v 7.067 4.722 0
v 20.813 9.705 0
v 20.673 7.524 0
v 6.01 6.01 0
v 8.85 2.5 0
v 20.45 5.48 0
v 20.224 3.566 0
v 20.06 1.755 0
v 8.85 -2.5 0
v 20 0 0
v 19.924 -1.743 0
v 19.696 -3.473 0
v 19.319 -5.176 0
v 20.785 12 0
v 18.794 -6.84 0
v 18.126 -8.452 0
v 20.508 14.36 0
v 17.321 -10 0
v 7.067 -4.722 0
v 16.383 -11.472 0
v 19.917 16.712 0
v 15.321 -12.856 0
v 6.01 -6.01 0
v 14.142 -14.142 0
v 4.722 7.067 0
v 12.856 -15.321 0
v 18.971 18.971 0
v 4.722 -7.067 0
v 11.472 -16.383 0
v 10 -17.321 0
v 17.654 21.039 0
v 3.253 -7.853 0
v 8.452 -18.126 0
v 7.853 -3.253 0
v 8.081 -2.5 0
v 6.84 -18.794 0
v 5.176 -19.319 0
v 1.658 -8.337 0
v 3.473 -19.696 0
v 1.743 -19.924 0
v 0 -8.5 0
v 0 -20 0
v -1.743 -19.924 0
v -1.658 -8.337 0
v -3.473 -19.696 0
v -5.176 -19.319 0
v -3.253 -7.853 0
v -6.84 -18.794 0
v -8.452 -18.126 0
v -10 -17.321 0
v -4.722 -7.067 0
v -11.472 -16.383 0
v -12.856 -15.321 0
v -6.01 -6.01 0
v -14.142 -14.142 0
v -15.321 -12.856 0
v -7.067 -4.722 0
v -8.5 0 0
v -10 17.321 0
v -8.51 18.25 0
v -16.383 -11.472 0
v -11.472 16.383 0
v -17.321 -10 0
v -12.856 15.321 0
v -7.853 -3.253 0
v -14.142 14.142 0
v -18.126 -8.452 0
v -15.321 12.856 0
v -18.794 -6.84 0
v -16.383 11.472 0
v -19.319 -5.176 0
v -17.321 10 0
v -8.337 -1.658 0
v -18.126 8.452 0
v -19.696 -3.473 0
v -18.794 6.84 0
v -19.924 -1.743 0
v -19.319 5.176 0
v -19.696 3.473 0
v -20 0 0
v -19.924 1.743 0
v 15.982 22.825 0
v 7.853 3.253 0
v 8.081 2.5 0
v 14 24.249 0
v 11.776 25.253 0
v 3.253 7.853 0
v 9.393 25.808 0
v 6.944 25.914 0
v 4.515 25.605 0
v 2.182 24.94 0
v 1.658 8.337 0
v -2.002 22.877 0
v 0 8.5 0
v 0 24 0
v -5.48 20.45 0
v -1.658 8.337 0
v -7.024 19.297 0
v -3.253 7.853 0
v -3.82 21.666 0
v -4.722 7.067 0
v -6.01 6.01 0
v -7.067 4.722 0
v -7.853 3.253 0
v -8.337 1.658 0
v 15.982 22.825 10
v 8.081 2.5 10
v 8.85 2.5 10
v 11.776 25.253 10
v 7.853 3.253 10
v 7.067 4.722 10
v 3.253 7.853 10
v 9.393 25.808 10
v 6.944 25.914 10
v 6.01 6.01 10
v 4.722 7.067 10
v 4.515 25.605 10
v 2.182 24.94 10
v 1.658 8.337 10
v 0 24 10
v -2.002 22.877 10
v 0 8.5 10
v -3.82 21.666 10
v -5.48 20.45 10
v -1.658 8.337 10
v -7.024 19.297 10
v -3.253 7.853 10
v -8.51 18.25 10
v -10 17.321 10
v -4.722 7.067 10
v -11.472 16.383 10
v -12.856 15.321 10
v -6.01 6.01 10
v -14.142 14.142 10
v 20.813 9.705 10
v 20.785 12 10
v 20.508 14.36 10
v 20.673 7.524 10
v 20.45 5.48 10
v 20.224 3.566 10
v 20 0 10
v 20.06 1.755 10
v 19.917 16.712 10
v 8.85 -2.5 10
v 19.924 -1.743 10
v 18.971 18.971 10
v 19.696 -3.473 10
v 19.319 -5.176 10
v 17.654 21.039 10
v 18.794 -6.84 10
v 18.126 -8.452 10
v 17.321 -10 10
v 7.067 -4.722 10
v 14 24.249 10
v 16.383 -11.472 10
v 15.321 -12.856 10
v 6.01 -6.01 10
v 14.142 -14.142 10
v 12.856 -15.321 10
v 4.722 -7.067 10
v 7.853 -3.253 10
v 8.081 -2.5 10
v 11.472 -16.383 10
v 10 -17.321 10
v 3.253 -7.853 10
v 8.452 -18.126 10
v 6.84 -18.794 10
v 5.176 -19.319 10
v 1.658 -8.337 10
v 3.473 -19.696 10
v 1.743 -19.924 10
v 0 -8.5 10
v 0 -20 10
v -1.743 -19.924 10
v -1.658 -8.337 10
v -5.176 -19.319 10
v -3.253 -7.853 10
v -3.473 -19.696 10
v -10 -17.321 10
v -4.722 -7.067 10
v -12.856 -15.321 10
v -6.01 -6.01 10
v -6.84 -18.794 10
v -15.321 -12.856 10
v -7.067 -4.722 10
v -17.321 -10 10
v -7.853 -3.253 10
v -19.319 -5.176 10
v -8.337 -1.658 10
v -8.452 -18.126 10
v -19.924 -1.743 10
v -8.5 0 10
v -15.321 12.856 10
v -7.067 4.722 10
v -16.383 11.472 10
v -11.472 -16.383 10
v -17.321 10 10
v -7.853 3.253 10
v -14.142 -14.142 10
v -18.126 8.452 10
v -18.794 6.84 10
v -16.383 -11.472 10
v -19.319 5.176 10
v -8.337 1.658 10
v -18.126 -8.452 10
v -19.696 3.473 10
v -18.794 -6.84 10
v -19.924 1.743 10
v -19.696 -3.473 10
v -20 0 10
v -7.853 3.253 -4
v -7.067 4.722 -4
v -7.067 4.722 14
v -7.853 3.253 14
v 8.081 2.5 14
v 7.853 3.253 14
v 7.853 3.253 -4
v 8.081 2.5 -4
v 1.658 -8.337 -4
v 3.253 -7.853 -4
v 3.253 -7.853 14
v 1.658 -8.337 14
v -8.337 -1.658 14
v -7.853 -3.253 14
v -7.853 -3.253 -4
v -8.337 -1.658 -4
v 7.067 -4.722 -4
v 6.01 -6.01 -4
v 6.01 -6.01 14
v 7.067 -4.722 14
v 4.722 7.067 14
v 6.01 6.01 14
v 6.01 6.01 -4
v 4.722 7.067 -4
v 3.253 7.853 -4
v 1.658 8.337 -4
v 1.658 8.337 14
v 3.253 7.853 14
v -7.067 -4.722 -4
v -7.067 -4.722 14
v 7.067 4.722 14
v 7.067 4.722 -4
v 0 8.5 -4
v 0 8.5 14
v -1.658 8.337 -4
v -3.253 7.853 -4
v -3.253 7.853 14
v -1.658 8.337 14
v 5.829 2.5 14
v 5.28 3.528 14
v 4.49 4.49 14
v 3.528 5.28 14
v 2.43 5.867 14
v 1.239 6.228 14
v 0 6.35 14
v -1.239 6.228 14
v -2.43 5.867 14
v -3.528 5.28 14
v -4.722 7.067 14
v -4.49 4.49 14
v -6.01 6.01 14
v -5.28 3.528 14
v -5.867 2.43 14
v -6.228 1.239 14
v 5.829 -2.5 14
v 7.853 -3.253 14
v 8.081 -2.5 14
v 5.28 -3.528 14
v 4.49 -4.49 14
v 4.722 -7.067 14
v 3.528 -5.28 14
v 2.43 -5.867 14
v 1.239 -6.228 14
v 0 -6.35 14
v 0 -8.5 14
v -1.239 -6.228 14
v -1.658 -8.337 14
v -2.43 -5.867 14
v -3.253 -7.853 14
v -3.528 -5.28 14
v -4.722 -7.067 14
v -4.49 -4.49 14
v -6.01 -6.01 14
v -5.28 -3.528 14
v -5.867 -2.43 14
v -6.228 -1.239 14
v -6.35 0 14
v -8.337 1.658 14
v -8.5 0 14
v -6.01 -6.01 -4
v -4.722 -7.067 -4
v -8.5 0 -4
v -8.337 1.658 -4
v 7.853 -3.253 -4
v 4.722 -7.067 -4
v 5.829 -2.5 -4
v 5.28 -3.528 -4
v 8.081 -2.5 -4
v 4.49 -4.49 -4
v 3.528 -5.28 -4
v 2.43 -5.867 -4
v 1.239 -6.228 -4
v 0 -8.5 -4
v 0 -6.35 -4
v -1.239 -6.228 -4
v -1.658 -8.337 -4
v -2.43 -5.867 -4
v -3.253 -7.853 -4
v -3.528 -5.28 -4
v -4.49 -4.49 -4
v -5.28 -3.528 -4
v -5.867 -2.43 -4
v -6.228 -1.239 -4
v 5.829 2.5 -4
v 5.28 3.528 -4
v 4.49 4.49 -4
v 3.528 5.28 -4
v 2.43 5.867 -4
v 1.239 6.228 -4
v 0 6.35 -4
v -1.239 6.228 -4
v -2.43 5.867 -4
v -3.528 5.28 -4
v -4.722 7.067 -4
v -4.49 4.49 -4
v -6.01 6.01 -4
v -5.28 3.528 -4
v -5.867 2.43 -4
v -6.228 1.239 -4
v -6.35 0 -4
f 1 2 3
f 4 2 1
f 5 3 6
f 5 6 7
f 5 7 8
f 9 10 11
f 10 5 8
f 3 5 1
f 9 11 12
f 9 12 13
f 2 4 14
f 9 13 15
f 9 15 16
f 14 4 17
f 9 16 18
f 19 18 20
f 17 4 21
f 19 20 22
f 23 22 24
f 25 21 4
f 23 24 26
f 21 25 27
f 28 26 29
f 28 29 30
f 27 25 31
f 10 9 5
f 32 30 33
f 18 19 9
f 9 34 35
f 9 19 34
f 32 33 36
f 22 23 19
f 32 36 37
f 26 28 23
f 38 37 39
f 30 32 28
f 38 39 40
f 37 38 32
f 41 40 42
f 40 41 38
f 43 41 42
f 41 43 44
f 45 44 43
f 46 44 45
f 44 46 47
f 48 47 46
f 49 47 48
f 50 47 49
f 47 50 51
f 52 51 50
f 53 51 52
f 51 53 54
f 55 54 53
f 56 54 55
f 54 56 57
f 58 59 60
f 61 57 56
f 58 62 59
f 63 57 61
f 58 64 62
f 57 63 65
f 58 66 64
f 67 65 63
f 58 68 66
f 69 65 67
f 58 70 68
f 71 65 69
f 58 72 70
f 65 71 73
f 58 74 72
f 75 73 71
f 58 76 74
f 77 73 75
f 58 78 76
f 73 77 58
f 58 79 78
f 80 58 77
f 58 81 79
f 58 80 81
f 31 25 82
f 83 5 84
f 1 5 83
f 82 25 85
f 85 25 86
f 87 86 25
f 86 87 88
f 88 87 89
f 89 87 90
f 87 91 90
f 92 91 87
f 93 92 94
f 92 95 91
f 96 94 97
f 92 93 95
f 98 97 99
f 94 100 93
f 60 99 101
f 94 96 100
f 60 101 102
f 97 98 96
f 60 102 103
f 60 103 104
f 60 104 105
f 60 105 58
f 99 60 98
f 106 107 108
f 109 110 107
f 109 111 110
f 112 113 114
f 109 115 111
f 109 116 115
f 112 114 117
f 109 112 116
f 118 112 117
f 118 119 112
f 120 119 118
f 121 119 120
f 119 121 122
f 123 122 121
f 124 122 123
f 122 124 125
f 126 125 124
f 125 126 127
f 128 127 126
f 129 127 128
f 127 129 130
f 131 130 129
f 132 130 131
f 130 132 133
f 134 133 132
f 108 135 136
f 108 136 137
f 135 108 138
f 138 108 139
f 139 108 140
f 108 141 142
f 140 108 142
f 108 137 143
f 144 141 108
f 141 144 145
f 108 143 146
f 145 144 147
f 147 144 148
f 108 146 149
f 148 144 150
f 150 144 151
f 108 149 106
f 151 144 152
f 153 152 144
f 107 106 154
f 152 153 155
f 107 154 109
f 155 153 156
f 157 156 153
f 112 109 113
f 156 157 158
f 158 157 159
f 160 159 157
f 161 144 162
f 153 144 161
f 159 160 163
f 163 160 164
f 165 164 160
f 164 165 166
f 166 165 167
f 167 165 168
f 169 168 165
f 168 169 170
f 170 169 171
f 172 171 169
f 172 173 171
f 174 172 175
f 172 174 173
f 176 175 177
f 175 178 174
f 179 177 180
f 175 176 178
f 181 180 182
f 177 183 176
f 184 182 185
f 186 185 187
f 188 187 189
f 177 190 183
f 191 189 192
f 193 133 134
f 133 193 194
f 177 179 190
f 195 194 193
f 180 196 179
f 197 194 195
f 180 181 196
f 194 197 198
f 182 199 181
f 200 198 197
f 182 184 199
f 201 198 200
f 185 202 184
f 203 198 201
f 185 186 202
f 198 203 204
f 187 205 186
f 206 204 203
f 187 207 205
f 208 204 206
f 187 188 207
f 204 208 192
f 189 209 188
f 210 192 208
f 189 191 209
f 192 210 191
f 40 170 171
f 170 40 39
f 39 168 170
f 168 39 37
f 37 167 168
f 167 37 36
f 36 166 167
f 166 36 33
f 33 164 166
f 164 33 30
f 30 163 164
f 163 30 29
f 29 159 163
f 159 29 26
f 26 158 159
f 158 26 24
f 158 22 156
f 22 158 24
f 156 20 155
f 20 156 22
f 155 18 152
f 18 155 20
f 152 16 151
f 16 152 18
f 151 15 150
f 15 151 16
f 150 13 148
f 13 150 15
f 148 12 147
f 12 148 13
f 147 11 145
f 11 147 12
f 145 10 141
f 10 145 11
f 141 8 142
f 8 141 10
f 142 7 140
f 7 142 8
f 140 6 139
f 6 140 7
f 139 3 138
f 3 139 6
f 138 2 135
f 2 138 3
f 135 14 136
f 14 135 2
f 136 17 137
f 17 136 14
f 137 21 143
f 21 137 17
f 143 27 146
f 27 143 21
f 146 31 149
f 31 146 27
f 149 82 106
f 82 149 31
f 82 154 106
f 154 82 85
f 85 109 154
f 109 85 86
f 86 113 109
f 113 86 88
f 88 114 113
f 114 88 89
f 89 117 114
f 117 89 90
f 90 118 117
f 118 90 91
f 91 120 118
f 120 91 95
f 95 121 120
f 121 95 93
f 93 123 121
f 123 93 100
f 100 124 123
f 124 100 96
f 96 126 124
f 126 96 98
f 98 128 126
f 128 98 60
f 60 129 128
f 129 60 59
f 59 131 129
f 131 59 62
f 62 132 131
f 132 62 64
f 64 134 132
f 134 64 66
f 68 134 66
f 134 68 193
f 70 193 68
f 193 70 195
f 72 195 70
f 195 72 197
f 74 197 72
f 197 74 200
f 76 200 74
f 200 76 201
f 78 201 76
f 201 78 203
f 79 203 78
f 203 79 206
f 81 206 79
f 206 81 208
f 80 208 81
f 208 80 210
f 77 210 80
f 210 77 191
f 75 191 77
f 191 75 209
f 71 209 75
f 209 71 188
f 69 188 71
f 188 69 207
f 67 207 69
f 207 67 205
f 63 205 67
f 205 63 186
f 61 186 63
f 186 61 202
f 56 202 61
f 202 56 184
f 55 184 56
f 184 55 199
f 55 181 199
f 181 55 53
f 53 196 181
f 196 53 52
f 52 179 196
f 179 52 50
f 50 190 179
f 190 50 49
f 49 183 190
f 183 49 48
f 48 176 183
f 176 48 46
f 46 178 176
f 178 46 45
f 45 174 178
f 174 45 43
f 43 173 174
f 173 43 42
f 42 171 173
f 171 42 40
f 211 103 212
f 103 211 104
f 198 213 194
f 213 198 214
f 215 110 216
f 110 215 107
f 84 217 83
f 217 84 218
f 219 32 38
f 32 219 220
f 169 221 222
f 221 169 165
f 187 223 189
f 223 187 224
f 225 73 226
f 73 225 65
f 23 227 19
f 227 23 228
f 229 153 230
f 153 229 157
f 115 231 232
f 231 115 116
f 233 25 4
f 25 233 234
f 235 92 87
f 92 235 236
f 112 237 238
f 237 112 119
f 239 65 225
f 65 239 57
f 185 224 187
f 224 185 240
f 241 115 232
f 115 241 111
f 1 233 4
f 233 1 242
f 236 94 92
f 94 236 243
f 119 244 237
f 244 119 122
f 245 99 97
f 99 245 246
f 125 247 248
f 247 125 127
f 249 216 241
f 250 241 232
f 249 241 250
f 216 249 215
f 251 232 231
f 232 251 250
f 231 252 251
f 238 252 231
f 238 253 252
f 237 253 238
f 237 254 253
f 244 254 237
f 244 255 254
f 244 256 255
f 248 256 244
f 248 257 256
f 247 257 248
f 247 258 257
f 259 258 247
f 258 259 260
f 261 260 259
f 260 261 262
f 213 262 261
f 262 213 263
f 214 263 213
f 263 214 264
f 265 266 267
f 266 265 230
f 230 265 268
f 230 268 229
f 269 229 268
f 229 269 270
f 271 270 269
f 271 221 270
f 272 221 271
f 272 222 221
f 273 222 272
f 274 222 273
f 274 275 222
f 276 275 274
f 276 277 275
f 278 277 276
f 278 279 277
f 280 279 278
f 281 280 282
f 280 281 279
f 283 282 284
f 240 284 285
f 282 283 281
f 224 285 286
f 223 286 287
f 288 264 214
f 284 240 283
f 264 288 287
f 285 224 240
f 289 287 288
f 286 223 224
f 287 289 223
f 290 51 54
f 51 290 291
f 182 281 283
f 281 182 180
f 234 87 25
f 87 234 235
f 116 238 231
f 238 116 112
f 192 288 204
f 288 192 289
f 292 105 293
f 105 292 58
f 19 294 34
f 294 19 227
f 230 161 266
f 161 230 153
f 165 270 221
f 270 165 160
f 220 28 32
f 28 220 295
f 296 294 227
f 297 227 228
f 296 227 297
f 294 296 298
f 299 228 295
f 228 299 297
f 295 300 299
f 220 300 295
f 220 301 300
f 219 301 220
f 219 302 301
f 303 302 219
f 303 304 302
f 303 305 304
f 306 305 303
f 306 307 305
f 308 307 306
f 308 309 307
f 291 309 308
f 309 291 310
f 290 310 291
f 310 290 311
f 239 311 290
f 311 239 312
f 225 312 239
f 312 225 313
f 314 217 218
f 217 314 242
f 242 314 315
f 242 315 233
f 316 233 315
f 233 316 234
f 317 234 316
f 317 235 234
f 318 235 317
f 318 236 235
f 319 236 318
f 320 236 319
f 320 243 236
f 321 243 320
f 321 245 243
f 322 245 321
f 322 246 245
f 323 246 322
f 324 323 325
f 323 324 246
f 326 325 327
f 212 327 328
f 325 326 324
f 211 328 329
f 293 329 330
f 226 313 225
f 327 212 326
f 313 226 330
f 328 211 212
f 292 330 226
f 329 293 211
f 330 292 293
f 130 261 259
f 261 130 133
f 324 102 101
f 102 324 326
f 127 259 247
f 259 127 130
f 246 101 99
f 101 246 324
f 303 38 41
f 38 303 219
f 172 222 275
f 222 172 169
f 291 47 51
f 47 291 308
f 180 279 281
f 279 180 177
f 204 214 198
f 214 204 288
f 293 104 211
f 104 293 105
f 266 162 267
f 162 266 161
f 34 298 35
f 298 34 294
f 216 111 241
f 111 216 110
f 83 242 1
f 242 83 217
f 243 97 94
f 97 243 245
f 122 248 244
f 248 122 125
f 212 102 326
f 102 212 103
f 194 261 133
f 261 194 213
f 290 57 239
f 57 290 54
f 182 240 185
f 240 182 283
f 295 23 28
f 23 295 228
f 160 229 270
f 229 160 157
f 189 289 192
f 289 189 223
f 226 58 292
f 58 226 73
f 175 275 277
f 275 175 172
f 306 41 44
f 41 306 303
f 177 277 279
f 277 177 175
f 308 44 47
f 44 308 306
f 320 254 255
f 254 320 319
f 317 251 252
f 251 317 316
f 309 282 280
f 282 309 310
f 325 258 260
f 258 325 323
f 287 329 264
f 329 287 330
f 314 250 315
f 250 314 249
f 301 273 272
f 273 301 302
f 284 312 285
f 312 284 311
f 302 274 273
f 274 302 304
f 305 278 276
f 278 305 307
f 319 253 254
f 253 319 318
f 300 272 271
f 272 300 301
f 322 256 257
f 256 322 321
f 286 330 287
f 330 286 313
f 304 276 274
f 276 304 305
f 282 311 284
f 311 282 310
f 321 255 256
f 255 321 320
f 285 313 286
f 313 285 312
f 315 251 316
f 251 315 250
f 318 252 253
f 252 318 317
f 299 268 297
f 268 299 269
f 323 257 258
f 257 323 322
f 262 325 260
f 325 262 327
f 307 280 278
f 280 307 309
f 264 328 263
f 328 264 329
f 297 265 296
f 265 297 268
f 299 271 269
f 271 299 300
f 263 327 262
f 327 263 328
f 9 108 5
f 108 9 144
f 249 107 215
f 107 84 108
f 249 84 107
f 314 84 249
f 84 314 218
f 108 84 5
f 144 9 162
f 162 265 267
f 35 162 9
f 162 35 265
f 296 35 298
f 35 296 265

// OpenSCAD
$fn = 32;

// ----------------------------------------------------------------------
// Cam: base radius 20 mm with a 8 mm lift over 120 degrees
// ----------------------------------------------------------------------

// --- parameters (mm) ---
base_r = 20;              // base radius
lift = 8;                 // lift height above the base radius
lift_span = 120;          // angular width of the lift
lift_start = 0;           // angle where the lift starts
cam_t = 10;               // cam plate thickness
hub_d = 17;               // hub diameter
hub_h = 18;               // hub height
bore_d = 12.7;            // bore
key_w = 5;                // keyway width
key_depth = 1.6;          // keyway depth

cam_profile = [[20, 0], [20.06, 1.755], [20.224, 3.566], [20.45, 5.48], [20.673, 7.524], [20.813, 9.705], [20.785, 12], [20.508, 14.36], [19.917, 16.712], [18.971, 18.971], [17.654, 21.039], [15.982, 22.825], [14, 24.249], [11.776, 25.253], [9.393, 25.808], [6.944, 25.914], [4.515, 25.605], [2.182, 24.94], [0, 24], [-2.002, 22.877], [-3.82, 21.666], [-5.48, 20.45], [-7.024, 19.297], [-8.51, 18.25], [-10, 17.321], [-11.472, 16.383], [-12.856, 15.321], [-14.142, 14.142], [-15.321, 12.856], [-16.383, 11.472], [-17.321, 10], [-18.126, 8.452], [-18.794, 6.84], [-19.319, 5.176], [-19.696, 3.473], [-19.924, 1.743], [-20, 0], [-19.924, -1.743], [-19.696, -3.473], [-19.319, -5.176], [-18.794, -6.84], [-18.126, -8.452], [-17.321, -10], [-16.383, -11.472], [-15.321, -12.856], [-14.142, -14.142], [-12.856, -15.321], [-11.472, -16.383], [-10, -17.321], [-8.452, -18.126], [-6.84, -18.794], [-5.176, -19.319], [-3.473, -19.696], [-1.743, -19.924], [0, -20], [1.743, -19.924], [3.473, -19.696], [5.176, -19.319], [6.84, -18.794], [8.452, -18.126], [10, -17.321], [11.472, -16.383], [12.856, -15.321], [14.142, -14.142], [15.321, -12.856], [16.383, -11.472], [17.321, -10], [18.126, -8.452], [18.794, -6.84], [19.319, -5.176], [19.696, -3.473], [19.924, -1.743]];

difference() {
  union() {
    linear_extrude(height = cam_t) polygon(cam_profile);
    /* hub, proud of the cam plate on both sides */
    translate([0, 0, -4]) cylinder(h = hub_h, d = hub_d);
  }
  /* bore through the hub, 2.5 mm clear on both faces */
  translate([0, 0, -6.5]) cylinder(h = hub_h + 5, d = bore_d);
  /* keyway, milled through the whole hub */
  translate([4.75, -2.5, -6.5]) cube([4.1, 5, 23]);
}
